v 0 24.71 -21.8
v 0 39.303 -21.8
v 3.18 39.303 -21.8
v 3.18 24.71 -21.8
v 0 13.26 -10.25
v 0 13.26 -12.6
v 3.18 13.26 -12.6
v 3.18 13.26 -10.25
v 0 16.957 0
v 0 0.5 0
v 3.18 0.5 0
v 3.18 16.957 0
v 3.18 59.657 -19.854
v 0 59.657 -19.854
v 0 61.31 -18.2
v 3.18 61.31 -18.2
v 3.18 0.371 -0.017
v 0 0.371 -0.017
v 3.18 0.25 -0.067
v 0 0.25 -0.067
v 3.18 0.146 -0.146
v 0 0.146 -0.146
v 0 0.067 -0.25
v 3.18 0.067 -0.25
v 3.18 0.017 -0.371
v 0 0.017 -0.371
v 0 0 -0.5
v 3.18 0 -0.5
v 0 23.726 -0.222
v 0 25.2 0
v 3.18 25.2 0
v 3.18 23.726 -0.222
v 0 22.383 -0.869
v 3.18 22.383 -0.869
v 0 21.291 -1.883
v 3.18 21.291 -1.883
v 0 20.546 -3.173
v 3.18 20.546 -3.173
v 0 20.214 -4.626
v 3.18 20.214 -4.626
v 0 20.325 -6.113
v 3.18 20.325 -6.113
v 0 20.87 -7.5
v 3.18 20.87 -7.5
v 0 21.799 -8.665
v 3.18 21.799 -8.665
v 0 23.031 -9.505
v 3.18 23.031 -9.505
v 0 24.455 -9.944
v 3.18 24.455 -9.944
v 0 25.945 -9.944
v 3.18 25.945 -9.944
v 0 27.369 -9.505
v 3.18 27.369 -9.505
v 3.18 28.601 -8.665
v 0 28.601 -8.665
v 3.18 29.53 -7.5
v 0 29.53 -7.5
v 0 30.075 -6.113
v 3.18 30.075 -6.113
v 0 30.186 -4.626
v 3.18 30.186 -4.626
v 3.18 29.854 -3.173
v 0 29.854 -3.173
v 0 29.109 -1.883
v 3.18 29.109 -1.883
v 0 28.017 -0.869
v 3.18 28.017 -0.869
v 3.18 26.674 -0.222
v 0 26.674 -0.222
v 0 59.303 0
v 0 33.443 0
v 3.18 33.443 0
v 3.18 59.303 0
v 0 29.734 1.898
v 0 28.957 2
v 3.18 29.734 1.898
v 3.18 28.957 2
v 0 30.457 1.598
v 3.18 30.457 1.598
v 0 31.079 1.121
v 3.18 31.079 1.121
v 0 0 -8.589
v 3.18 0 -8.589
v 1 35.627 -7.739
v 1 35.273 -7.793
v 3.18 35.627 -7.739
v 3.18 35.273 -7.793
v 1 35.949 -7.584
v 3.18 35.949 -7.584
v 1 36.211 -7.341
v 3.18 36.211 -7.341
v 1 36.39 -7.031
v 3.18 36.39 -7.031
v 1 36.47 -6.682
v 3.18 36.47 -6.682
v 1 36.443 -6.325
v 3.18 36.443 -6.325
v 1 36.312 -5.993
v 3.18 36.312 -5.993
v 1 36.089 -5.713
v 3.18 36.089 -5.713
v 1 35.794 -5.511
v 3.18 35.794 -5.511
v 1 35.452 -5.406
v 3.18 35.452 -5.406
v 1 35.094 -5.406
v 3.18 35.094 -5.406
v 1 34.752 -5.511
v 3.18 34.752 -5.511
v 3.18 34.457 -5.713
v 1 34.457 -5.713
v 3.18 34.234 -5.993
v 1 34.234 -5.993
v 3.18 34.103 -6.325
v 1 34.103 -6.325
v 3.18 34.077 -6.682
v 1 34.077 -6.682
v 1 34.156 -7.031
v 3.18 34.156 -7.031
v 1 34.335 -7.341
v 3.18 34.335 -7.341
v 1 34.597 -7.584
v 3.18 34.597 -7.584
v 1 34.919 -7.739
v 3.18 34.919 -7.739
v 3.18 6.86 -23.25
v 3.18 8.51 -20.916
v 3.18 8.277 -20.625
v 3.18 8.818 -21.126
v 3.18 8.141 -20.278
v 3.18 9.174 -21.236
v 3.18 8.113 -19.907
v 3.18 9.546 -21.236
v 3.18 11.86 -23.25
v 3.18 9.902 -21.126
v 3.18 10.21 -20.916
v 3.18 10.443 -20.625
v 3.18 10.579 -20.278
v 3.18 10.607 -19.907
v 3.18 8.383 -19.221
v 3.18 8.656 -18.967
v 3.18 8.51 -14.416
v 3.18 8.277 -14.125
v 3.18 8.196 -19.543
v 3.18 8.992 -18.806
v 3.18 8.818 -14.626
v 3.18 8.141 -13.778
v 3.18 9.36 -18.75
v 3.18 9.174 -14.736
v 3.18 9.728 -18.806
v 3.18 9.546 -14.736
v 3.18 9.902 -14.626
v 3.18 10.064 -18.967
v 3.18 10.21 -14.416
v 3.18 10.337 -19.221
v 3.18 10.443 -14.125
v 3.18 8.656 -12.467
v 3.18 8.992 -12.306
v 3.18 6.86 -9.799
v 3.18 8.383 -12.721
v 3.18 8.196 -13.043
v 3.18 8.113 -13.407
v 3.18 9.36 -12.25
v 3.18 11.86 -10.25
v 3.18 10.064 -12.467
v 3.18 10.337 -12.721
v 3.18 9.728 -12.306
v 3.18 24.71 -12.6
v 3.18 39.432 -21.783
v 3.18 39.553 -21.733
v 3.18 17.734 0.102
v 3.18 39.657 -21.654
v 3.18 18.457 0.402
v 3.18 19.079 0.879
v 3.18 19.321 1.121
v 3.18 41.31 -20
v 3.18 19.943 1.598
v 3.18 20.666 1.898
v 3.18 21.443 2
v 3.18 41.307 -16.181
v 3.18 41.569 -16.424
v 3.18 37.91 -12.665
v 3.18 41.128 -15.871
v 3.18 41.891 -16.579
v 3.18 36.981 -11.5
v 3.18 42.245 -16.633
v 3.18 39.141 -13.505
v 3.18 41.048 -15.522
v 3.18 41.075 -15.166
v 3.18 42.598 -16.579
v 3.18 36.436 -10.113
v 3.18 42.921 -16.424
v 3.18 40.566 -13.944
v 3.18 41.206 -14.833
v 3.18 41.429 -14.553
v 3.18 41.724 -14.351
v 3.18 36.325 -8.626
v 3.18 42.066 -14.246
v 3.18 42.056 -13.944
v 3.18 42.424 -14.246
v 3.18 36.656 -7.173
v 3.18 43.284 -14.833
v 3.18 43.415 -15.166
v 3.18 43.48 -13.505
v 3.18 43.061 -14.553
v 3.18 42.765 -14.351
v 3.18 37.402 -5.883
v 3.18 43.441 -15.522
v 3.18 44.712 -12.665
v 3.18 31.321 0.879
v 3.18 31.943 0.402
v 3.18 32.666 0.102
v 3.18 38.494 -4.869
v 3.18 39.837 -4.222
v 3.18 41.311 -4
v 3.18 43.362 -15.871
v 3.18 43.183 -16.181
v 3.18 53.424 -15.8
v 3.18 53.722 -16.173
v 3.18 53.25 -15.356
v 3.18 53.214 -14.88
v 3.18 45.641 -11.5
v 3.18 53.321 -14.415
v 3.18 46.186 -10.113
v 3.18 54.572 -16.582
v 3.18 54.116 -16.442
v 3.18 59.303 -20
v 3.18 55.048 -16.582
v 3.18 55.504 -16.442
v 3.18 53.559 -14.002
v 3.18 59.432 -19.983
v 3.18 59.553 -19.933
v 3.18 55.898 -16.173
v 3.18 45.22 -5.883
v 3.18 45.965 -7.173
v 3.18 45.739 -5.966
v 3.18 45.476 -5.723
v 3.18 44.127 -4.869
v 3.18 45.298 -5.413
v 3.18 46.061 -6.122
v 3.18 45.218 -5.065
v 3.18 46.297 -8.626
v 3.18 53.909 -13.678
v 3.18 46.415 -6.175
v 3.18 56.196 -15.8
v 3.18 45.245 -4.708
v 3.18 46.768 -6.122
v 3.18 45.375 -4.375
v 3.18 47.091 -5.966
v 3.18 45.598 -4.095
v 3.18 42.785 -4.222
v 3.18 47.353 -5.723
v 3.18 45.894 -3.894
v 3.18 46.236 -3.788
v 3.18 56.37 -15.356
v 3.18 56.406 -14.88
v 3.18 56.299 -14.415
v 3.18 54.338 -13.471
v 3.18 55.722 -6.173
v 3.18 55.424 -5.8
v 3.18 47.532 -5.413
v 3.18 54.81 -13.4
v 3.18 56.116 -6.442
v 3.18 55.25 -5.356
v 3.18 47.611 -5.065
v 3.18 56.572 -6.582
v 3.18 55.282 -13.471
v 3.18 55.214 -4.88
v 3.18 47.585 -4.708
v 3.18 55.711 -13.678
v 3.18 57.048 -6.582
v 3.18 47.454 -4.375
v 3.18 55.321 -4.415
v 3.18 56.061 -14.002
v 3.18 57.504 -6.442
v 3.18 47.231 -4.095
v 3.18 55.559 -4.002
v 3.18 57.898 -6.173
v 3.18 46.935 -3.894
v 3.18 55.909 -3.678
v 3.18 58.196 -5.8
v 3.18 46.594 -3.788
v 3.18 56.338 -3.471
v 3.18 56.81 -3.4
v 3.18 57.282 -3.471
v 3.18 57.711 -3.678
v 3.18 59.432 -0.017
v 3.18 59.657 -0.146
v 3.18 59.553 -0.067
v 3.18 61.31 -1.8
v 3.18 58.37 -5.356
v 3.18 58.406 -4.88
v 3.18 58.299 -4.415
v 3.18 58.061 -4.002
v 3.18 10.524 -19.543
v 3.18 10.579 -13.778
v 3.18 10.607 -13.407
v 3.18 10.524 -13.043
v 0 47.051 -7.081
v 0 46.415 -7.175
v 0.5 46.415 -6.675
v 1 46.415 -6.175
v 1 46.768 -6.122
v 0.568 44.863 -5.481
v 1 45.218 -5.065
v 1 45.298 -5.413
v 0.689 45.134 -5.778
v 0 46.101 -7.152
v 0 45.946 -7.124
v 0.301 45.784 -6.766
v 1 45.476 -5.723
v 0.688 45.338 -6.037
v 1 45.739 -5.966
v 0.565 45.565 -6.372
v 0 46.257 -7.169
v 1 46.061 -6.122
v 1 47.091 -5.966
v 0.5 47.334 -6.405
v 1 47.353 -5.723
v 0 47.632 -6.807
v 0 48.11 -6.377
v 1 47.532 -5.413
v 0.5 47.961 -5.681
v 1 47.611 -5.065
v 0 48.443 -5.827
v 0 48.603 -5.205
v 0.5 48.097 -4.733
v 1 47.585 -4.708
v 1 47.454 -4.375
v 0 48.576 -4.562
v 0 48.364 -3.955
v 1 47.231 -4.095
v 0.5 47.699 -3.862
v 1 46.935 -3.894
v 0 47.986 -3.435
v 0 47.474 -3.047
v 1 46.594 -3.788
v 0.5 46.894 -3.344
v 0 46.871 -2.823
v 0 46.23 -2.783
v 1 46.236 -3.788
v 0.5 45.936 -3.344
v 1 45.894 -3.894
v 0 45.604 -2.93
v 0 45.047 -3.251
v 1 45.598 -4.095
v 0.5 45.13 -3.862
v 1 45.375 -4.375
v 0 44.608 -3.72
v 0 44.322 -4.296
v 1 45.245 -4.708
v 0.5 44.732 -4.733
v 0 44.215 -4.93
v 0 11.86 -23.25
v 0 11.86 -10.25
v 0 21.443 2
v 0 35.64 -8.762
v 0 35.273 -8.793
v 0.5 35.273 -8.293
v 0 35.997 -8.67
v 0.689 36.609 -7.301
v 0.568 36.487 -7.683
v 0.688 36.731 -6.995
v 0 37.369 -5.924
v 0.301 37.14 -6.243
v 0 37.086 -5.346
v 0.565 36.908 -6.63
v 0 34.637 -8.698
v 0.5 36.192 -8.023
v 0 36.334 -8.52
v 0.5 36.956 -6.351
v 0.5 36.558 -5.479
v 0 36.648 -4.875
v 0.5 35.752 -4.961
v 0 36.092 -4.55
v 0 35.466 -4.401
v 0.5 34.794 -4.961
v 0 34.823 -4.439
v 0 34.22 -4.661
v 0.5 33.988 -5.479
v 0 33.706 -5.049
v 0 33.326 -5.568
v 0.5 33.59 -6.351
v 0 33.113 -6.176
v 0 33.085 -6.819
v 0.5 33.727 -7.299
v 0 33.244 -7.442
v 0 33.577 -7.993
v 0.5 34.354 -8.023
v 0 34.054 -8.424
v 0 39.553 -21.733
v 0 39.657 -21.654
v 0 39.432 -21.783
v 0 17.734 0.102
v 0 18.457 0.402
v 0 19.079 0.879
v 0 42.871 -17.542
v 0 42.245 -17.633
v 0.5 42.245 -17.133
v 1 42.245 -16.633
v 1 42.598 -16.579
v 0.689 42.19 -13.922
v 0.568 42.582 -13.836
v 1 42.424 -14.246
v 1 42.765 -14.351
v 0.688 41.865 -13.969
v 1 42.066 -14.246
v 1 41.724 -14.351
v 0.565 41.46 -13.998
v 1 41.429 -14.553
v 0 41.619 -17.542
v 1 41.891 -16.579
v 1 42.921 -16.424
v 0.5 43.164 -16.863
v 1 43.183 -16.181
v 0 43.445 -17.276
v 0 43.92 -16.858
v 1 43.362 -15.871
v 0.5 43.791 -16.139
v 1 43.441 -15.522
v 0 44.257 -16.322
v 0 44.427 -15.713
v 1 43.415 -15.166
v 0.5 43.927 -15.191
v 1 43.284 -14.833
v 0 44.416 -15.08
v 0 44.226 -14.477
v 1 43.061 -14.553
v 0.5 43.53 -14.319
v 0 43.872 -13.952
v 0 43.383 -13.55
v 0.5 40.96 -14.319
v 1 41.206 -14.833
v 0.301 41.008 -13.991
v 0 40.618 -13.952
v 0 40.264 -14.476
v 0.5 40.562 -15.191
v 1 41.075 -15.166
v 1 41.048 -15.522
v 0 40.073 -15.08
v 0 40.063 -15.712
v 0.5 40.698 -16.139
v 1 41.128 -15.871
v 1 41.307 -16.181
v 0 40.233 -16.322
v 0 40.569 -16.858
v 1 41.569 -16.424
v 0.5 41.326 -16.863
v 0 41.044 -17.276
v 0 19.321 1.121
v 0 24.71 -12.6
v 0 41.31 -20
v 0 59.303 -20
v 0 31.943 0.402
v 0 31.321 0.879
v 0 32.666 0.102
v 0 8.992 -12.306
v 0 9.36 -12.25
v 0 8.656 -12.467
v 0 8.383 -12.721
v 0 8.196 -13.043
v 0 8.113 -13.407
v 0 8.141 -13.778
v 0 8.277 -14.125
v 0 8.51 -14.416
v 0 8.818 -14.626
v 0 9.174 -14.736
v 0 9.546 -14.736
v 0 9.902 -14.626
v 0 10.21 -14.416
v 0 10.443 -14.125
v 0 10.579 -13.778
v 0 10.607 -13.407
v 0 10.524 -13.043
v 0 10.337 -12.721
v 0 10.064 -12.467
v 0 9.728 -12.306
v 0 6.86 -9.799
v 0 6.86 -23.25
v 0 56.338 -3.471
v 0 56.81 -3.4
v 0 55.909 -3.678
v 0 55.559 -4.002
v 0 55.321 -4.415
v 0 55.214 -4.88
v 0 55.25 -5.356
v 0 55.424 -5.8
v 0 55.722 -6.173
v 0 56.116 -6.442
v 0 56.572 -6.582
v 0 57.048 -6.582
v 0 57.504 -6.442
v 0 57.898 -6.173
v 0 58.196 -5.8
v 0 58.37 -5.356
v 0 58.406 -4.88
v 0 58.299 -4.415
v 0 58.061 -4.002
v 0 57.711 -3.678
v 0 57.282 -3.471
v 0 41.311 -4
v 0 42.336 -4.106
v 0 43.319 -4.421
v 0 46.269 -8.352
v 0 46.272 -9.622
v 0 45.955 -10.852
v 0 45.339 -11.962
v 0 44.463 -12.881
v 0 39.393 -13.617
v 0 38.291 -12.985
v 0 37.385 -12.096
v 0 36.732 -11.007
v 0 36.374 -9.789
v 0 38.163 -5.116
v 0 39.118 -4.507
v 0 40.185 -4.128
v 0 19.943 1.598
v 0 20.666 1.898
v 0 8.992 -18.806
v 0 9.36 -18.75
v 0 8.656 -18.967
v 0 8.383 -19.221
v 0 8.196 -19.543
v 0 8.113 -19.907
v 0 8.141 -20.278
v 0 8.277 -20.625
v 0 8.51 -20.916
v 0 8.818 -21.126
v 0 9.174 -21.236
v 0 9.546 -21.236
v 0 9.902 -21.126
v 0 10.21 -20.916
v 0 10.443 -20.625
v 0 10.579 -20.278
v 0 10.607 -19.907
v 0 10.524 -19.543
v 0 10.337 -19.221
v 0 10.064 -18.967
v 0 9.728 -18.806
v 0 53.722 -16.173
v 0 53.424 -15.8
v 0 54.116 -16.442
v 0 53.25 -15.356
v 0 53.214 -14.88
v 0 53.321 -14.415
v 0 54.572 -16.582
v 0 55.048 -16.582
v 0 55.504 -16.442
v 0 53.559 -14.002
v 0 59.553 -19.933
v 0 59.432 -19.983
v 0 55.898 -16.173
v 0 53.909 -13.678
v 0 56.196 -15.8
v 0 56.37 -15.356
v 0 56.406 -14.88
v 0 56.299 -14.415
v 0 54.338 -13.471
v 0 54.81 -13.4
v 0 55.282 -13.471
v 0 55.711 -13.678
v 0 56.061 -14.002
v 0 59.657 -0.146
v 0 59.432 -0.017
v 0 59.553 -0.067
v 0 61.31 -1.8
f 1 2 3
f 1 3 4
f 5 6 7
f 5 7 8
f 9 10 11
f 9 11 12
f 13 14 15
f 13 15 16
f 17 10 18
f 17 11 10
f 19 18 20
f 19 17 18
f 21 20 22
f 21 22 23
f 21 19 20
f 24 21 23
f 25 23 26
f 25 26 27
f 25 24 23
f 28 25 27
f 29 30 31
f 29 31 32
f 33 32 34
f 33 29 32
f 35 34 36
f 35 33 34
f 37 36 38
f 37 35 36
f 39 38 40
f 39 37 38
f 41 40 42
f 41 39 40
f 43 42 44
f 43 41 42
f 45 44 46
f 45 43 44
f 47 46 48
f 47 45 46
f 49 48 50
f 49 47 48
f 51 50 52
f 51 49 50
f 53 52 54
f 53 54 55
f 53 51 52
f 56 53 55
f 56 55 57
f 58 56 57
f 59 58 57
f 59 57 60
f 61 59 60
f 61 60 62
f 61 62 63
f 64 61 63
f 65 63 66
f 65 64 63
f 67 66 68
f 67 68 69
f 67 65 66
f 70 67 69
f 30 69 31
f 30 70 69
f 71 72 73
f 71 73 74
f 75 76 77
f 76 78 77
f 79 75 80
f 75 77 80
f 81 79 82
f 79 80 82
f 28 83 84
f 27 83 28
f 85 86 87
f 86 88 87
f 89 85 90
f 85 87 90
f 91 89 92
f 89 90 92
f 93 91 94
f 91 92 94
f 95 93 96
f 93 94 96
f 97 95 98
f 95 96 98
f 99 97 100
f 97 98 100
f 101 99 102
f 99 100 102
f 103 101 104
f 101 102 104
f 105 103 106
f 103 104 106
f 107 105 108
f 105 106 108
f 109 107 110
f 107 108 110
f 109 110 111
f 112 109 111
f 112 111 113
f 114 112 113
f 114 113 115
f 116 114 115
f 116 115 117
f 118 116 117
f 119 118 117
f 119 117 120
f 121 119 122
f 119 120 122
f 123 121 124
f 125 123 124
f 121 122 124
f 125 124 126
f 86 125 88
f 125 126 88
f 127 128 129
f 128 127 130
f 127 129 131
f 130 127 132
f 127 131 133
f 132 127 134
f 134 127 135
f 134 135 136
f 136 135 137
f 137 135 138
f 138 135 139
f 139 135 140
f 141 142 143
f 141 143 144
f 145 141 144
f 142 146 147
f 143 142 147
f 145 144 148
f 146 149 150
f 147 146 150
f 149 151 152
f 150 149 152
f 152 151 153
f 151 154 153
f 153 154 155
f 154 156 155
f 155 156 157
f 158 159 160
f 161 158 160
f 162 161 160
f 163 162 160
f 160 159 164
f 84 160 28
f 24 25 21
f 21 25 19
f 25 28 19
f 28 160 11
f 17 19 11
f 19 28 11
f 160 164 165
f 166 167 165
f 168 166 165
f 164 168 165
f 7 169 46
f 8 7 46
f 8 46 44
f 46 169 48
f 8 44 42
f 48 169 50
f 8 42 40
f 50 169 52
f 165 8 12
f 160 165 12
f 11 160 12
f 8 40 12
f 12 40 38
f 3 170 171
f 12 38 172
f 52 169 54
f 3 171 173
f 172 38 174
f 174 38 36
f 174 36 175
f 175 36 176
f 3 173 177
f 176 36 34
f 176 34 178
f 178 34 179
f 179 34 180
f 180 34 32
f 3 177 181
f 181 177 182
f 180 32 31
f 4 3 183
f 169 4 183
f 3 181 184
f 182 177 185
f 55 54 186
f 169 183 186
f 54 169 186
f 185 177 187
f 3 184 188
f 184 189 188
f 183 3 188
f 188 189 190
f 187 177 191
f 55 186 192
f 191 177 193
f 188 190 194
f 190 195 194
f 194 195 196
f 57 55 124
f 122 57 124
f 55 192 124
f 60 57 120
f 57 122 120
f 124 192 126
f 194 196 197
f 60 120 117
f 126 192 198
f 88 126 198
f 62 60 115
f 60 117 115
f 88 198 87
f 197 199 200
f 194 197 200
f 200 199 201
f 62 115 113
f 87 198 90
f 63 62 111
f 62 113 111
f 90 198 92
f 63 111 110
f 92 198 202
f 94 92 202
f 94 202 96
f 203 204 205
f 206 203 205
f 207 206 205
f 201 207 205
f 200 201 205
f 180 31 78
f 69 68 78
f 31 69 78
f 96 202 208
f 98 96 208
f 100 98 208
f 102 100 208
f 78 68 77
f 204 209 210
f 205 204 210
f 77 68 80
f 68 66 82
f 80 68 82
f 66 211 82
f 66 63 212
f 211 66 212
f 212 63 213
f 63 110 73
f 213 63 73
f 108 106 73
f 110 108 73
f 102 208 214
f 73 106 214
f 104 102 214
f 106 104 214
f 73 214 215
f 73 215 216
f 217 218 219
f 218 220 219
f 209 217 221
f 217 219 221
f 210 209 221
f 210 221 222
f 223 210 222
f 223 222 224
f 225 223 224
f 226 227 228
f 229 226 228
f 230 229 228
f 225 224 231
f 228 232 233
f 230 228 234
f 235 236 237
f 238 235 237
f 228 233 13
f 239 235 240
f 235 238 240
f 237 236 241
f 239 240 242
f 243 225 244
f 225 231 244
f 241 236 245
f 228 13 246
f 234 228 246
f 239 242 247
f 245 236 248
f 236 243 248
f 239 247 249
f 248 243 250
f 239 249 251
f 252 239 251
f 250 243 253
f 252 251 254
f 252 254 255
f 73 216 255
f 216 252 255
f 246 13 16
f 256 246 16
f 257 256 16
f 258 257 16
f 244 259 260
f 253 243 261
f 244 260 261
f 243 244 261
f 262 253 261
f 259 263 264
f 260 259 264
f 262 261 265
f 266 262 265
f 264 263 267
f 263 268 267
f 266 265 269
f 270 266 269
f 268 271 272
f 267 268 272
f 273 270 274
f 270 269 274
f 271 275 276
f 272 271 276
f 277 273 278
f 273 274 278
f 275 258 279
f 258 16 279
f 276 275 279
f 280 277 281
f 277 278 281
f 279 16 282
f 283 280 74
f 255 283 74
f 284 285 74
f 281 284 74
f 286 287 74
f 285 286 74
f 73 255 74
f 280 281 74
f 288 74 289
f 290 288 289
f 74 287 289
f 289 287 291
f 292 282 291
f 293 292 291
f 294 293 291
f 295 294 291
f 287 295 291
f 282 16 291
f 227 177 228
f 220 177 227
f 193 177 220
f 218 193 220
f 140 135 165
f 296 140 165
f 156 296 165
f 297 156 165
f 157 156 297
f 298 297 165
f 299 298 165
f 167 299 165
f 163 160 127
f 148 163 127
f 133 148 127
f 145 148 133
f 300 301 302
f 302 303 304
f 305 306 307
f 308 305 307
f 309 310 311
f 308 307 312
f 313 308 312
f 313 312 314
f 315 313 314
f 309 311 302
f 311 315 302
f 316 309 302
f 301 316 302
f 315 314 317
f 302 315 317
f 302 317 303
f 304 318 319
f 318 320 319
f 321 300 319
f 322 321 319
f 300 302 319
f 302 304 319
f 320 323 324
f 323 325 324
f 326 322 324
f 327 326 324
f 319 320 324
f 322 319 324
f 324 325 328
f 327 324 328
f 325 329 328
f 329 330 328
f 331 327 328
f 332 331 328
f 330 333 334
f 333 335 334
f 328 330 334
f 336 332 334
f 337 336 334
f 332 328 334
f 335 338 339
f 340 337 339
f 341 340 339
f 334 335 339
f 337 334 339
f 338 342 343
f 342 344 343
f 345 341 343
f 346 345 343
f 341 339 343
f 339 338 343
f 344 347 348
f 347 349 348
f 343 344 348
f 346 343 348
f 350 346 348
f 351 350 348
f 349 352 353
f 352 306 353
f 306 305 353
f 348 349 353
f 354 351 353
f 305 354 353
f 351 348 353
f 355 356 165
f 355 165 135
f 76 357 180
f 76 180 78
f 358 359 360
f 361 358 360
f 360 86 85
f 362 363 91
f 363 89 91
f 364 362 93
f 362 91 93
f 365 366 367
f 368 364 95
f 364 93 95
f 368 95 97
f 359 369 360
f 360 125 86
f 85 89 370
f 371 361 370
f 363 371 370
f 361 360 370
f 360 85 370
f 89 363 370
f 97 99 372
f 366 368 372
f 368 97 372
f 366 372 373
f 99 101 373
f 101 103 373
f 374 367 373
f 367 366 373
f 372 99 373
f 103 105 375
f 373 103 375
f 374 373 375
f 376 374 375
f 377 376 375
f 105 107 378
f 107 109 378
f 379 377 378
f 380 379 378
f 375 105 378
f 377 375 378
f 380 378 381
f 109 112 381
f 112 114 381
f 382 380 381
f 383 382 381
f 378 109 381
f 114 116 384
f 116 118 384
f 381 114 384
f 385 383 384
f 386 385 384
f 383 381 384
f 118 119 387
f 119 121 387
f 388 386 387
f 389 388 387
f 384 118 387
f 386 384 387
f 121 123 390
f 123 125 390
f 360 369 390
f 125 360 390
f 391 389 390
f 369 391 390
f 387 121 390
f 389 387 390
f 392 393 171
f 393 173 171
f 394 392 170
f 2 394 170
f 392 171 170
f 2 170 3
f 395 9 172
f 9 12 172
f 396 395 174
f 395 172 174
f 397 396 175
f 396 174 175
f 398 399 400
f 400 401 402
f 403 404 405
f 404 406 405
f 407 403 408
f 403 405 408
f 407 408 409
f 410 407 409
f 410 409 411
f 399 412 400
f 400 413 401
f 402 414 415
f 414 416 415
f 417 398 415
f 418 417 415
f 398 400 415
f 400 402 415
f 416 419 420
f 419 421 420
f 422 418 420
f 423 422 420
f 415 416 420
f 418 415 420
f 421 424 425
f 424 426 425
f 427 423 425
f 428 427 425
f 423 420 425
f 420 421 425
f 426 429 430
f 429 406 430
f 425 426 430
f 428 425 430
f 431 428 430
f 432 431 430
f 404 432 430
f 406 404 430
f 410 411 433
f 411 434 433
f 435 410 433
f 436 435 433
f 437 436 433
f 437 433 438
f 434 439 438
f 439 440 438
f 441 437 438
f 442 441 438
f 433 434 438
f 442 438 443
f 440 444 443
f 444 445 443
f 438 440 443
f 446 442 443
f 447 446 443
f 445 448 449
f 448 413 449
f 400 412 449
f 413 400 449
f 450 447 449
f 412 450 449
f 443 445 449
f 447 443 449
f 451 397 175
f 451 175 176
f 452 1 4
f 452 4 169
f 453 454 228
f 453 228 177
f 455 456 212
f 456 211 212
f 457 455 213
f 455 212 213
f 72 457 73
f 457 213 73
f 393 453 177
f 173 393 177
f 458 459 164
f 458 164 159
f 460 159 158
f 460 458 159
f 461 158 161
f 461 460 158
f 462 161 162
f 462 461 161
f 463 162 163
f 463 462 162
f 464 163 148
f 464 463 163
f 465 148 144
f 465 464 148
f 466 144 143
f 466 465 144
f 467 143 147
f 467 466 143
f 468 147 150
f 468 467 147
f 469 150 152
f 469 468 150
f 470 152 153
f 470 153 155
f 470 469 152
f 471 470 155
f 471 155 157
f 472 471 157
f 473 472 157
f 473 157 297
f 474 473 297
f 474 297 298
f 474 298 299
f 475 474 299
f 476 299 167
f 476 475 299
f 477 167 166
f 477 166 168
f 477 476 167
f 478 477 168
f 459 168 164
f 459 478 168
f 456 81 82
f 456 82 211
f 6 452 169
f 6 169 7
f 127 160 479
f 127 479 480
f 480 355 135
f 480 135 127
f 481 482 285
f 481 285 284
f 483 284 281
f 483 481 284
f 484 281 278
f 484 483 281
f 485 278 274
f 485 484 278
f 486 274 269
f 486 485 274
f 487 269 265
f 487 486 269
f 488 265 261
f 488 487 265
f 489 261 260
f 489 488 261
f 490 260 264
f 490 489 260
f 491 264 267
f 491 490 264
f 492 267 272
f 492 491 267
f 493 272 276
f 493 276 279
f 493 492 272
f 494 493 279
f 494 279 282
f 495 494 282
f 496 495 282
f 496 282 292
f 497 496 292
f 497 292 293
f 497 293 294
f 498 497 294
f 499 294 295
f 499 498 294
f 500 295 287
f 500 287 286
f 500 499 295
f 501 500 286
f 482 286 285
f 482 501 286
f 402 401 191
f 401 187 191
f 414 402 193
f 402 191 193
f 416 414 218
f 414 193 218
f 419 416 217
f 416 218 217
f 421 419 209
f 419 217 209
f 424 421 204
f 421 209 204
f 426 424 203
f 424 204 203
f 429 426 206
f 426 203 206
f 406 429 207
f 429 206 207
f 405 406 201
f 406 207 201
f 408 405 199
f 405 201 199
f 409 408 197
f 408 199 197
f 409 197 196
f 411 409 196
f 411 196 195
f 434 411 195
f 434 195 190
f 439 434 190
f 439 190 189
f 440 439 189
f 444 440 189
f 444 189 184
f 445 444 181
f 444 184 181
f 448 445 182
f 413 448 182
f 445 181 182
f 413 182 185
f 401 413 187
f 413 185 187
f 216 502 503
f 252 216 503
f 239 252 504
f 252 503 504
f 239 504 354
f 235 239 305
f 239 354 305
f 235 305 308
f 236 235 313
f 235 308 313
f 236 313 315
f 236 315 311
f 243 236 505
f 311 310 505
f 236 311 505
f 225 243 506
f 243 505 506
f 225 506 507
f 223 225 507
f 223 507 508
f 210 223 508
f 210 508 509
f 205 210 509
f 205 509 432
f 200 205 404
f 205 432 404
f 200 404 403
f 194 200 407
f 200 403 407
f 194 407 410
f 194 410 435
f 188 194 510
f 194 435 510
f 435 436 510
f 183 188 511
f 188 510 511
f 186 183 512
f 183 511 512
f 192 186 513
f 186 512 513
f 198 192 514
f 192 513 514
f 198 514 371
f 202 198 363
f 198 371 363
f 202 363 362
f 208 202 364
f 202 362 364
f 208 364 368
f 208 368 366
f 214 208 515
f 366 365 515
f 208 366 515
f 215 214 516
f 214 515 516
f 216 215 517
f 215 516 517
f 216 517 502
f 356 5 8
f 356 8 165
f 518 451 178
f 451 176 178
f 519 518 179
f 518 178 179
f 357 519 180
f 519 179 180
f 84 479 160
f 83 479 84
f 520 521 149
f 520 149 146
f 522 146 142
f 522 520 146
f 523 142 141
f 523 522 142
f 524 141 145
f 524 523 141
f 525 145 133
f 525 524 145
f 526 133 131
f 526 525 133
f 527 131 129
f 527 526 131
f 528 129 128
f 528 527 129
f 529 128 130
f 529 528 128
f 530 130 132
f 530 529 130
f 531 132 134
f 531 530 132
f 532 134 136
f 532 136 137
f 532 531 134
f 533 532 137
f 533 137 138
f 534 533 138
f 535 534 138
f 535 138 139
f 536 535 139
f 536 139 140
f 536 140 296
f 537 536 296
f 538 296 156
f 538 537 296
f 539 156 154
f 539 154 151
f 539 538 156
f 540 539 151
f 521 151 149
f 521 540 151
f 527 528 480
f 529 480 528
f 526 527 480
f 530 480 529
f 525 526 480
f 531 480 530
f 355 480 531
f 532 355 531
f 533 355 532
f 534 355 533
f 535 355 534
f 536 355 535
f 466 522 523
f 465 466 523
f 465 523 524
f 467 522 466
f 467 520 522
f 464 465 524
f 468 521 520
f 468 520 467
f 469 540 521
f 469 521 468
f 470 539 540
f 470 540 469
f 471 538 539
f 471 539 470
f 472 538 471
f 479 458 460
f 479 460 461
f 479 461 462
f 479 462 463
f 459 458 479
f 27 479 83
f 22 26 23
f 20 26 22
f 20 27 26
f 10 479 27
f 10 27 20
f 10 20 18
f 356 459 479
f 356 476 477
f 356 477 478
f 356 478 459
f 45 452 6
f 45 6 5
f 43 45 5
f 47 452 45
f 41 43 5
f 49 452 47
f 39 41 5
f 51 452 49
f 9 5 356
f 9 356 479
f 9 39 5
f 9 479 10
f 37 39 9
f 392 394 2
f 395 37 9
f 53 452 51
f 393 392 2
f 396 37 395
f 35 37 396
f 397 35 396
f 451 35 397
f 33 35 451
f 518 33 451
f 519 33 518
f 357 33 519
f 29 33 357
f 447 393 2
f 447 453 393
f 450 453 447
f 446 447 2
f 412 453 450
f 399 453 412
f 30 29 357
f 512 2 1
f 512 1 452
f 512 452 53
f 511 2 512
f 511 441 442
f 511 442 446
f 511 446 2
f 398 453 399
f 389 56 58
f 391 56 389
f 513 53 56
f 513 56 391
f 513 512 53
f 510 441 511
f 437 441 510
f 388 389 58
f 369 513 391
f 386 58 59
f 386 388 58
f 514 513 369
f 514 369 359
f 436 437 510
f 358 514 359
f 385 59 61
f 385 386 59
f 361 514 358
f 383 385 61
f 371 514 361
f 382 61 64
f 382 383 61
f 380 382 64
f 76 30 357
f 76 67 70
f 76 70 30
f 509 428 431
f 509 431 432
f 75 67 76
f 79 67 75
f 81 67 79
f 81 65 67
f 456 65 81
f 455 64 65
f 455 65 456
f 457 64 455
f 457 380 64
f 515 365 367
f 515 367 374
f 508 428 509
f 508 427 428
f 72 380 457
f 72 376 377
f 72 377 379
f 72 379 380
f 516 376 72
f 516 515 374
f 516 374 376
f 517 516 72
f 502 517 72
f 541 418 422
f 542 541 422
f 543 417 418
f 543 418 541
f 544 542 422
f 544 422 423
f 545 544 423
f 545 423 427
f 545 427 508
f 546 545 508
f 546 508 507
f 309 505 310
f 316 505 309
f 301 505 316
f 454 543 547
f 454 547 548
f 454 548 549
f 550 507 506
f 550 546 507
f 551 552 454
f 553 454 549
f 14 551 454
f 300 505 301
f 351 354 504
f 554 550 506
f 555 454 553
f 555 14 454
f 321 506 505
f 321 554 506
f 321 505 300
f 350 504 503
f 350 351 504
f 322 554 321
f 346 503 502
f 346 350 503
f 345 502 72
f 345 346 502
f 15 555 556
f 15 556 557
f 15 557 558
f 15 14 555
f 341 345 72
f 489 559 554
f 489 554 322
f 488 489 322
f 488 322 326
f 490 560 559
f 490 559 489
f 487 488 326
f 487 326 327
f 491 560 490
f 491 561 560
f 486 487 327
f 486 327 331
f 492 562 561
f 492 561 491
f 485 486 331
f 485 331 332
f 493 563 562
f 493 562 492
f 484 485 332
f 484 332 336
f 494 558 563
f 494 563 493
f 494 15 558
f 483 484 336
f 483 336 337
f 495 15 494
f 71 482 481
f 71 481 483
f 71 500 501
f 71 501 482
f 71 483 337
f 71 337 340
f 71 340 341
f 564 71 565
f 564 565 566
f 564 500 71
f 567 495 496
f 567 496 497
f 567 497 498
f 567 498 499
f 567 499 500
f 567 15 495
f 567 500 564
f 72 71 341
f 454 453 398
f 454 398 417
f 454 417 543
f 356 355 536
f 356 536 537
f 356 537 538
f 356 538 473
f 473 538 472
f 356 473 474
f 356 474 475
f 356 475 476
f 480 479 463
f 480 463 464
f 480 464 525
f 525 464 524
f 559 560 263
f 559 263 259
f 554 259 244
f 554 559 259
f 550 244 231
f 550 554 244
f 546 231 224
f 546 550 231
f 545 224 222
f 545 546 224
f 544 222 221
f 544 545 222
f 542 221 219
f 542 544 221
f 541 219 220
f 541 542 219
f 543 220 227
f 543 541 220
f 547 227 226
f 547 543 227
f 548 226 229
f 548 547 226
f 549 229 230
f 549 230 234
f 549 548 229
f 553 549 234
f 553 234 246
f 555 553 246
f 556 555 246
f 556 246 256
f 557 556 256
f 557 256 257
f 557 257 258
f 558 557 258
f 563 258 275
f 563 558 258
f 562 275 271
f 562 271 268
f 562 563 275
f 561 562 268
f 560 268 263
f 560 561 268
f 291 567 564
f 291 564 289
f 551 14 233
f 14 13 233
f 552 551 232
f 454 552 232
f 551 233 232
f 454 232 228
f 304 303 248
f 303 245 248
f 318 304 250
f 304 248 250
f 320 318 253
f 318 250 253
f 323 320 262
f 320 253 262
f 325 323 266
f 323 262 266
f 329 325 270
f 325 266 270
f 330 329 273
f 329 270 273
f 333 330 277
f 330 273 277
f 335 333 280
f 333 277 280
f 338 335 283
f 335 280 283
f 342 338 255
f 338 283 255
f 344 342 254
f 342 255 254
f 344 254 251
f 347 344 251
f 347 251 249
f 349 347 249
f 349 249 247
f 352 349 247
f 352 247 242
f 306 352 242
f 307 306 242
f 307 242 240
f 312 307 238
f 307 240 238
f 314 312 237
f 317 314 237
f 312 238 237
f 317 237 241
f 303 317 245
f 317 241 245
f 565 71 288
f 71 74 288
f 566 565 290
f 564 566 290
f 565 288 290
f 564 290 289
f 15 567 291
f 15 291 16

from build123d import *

# Parameters (mm, degrees)
SKETCH1_R                                       = 5
SKETCH1_R_2                                     = 1.6
SKETCH1_R_3                                     = 1.25
BOSS_EXTRUDE1_DEPTH                             = 3.18
CHAMFER1_SIZE                                   = 8
CHAMFER1_SIZE_2                                 = 1.410615846
CSK_FOR_M2_FLAT_HEAD_MACHINE_SCREW1_D           = 2.4
CSK_FOR_M2_FLAT_HEAD_MACHINE_SCREW1_DEPTH       = 3.508967257
CSK_FOR_M2_FLAT_HEAD_MACHINE_SCREW1_CSINK_D     = 4.4
CSK_FOR_M2_FLAT_HEAD_MACHINE_SCREW1_CSINK_ANGLE = 90
CSK_FOR_M2_FLAT_HEAD_MACHINE_SCREW1_TIP         = 0.721032743
SKETCH3_R                                       = 5
CUT_EXTRUDE4_DEPTH                              = 66.647475199
FILLET2_R                                       = 3
CHAMFER2_SIZE                                   = 1.8
FILLET4_R                                       = 0.5


# Some blends are built 0.0001 mm under size
with BuildPart() as part:
    # Sketch1 → Boss-Extrude1 (new body)
    with BuildSketch(Plane(origin=(0, 0, 0), x_dir=(0, 0, -1), z_dir=(1, 0, 0))):
        Polygon((0, 0), (0, 18.2), (-2, 20.2), (-2, 30.2), (0, 32.2), (0, 61.31), (20, 61.31), (20, 41.31), (21.8, 41.31), (21.8, 24.71), (12.6, 24.71), (12.6, 13.26), (10.25, 13.26), (10.25, 11.86), (23.25, 11.86), (23.25, 6.86), (10, 6.86), (10, 0), align=None)
        with Locations(Location((5, 25.2, 0), (0, 0, 180))):
            Circle(SKETCH1_R, mode=Mode.SUBTRACT)
        with Locations(Location((5, 56.81, 0), (0, 0, 180))):
            Circle(SKETCH1_R_2, mode=Mode.SUBTRACT)
        with Locations(Location((15, 54.81, 0), (0, 0, 180))):
            Circle(SKETCH1_R_2, mode=Mode.SUBTRACT)
        with Locations(Location((20, 9.36, 0), (0, 0, 180))):
            Circle(SKETCH1_R_3, mode=Mode.SUBTRACT)
        with Locations(Location((13.5, 9.36, 0), (0, 0, 180))):
            Circle(SKETCH1_R_3, mode=Mode.SUBTRACT)
    extrude(amount=BOSS_EXTRUDE1_DEPTH)

    # Chamfer1
    # the kernel refuses this chamfer: 8, 1.410615846 mm, written as the material it takes off along each edge
    with BuildSketch(Plane(origin=(-20.788310371, 0, -10), x_dir=(0, 0.9999776716360547, -0.006682531656101032), z_dir=(1, 0, 0))) as chamfer1_piece_1_section:
        Polygon((CHAMFER1_SIZE * 0.999977671636, CHAMFER1_SIZE * 0.0066825316561), (-CHAMFER1_SIZE_2 * 0.00668253165453, CHAMFER1_SIZE_2 * 0.999977671401), (0, 0), align=None)
    chamfer1_piece_1 = extrude(amount=44.756620743, mode=Mode.PRIVATE)
    chamfer1_piece_1 = split(chamfer1_piece_1, bisect_by=Plane(origin=(1.59, 6.86, -9.594110318), z_dir=(0, -1, 0)), keep=Keep.TOP, mode=Mode.PRIVATE)
    add(chamfer1_piece_1, mode=Mode.SUBTRACT)

    # CSK for M2 Flat Head Machine Screw1
    with Locations(Plane.ZY):
        with Locations((-4.974936087, 46.414674329), (-15.432559713, 42.244769284), (-6.592504199, 35.273154083)):
            CounterSinkHole(CSK_FOR_M2_FLAT_HEAD_MACHINE_SCREW1_D / 2, CSK_FOR_M2_FLAT_HEAD_MACHINE_SCREW1_CSINK_D / 2, depth=CSK_FOR_M2_FLAT_HEAD_MACHINE_SCREW1_DEPTH, counter_sink_angle=CSK_FOR_M2_FLAT_HEAD_MACHINE_SCREW1_CSINK_ANGLE)
            with Locations((0, 0, -(CSK_FOR_M2_FLAT_HEAD_MACHINE_SCREW1_DEPTH + CSK_FOR_M2_FLAT_HEAD_MACHINE_SCREW1_TIP / 2))):  # 118° drill point
                Cone(0, CSK_FOR_M2_FLAT_HEAD_MACHINE_SCREW1_D / 2, CSK_FOR_M2_FLAT_HEAD_MACHINE_SCREW1_TIP, mode=Mode.SUBTRACT)

    # Sketch3 → Cut-Extrude4 (cut, through all)
    with BuildSketch(Plane.ZY):
        with Locations((-9, 41.310865899)):
            Circle(SKETCH3_R)
    extrude(amount=-CUT_EXTRUDE4_DEPTH, mode=Mode.SUBTRACT)

    # Fillet2
    fillet2_edges = [part.edges().sort_by_distance(p)[0] for p in [
        (1.59, 18.2, 0),
        (1.59, 20.2, 2),
        (1.59, 30.2, 2),
        (1.59, 32.2, 0),
    ]]
    fillet(fillet2_edges, radius=FILLET2_R)

    # Chamfer2
    chamfer2_edges = [part.edges().sort_by_distance(p)[0] for p in [
        (1.59, 61.31, -20),
        (1.59, 61.31, 0),
        (1.59, 41.31, -21.8),
    ]]
    chamfer(chamfer2_edges, length=CHAMFER2_SIZE - 0.0001)  # a hair under: the kernel refuses the full size

    # Fillet4
    fillet4_edges = [part.edges().sort_by_distance(p)[0] for p in [
        (1.59, 39.5101, -21.8),
        (1.59, 59.5101, -20),
        (1.59, 59.5101, 0),
        (1.59, 0, 0),
    ]]
    fillet(fillet4_edges, radius=FILLET4_R)


solid = part.part
